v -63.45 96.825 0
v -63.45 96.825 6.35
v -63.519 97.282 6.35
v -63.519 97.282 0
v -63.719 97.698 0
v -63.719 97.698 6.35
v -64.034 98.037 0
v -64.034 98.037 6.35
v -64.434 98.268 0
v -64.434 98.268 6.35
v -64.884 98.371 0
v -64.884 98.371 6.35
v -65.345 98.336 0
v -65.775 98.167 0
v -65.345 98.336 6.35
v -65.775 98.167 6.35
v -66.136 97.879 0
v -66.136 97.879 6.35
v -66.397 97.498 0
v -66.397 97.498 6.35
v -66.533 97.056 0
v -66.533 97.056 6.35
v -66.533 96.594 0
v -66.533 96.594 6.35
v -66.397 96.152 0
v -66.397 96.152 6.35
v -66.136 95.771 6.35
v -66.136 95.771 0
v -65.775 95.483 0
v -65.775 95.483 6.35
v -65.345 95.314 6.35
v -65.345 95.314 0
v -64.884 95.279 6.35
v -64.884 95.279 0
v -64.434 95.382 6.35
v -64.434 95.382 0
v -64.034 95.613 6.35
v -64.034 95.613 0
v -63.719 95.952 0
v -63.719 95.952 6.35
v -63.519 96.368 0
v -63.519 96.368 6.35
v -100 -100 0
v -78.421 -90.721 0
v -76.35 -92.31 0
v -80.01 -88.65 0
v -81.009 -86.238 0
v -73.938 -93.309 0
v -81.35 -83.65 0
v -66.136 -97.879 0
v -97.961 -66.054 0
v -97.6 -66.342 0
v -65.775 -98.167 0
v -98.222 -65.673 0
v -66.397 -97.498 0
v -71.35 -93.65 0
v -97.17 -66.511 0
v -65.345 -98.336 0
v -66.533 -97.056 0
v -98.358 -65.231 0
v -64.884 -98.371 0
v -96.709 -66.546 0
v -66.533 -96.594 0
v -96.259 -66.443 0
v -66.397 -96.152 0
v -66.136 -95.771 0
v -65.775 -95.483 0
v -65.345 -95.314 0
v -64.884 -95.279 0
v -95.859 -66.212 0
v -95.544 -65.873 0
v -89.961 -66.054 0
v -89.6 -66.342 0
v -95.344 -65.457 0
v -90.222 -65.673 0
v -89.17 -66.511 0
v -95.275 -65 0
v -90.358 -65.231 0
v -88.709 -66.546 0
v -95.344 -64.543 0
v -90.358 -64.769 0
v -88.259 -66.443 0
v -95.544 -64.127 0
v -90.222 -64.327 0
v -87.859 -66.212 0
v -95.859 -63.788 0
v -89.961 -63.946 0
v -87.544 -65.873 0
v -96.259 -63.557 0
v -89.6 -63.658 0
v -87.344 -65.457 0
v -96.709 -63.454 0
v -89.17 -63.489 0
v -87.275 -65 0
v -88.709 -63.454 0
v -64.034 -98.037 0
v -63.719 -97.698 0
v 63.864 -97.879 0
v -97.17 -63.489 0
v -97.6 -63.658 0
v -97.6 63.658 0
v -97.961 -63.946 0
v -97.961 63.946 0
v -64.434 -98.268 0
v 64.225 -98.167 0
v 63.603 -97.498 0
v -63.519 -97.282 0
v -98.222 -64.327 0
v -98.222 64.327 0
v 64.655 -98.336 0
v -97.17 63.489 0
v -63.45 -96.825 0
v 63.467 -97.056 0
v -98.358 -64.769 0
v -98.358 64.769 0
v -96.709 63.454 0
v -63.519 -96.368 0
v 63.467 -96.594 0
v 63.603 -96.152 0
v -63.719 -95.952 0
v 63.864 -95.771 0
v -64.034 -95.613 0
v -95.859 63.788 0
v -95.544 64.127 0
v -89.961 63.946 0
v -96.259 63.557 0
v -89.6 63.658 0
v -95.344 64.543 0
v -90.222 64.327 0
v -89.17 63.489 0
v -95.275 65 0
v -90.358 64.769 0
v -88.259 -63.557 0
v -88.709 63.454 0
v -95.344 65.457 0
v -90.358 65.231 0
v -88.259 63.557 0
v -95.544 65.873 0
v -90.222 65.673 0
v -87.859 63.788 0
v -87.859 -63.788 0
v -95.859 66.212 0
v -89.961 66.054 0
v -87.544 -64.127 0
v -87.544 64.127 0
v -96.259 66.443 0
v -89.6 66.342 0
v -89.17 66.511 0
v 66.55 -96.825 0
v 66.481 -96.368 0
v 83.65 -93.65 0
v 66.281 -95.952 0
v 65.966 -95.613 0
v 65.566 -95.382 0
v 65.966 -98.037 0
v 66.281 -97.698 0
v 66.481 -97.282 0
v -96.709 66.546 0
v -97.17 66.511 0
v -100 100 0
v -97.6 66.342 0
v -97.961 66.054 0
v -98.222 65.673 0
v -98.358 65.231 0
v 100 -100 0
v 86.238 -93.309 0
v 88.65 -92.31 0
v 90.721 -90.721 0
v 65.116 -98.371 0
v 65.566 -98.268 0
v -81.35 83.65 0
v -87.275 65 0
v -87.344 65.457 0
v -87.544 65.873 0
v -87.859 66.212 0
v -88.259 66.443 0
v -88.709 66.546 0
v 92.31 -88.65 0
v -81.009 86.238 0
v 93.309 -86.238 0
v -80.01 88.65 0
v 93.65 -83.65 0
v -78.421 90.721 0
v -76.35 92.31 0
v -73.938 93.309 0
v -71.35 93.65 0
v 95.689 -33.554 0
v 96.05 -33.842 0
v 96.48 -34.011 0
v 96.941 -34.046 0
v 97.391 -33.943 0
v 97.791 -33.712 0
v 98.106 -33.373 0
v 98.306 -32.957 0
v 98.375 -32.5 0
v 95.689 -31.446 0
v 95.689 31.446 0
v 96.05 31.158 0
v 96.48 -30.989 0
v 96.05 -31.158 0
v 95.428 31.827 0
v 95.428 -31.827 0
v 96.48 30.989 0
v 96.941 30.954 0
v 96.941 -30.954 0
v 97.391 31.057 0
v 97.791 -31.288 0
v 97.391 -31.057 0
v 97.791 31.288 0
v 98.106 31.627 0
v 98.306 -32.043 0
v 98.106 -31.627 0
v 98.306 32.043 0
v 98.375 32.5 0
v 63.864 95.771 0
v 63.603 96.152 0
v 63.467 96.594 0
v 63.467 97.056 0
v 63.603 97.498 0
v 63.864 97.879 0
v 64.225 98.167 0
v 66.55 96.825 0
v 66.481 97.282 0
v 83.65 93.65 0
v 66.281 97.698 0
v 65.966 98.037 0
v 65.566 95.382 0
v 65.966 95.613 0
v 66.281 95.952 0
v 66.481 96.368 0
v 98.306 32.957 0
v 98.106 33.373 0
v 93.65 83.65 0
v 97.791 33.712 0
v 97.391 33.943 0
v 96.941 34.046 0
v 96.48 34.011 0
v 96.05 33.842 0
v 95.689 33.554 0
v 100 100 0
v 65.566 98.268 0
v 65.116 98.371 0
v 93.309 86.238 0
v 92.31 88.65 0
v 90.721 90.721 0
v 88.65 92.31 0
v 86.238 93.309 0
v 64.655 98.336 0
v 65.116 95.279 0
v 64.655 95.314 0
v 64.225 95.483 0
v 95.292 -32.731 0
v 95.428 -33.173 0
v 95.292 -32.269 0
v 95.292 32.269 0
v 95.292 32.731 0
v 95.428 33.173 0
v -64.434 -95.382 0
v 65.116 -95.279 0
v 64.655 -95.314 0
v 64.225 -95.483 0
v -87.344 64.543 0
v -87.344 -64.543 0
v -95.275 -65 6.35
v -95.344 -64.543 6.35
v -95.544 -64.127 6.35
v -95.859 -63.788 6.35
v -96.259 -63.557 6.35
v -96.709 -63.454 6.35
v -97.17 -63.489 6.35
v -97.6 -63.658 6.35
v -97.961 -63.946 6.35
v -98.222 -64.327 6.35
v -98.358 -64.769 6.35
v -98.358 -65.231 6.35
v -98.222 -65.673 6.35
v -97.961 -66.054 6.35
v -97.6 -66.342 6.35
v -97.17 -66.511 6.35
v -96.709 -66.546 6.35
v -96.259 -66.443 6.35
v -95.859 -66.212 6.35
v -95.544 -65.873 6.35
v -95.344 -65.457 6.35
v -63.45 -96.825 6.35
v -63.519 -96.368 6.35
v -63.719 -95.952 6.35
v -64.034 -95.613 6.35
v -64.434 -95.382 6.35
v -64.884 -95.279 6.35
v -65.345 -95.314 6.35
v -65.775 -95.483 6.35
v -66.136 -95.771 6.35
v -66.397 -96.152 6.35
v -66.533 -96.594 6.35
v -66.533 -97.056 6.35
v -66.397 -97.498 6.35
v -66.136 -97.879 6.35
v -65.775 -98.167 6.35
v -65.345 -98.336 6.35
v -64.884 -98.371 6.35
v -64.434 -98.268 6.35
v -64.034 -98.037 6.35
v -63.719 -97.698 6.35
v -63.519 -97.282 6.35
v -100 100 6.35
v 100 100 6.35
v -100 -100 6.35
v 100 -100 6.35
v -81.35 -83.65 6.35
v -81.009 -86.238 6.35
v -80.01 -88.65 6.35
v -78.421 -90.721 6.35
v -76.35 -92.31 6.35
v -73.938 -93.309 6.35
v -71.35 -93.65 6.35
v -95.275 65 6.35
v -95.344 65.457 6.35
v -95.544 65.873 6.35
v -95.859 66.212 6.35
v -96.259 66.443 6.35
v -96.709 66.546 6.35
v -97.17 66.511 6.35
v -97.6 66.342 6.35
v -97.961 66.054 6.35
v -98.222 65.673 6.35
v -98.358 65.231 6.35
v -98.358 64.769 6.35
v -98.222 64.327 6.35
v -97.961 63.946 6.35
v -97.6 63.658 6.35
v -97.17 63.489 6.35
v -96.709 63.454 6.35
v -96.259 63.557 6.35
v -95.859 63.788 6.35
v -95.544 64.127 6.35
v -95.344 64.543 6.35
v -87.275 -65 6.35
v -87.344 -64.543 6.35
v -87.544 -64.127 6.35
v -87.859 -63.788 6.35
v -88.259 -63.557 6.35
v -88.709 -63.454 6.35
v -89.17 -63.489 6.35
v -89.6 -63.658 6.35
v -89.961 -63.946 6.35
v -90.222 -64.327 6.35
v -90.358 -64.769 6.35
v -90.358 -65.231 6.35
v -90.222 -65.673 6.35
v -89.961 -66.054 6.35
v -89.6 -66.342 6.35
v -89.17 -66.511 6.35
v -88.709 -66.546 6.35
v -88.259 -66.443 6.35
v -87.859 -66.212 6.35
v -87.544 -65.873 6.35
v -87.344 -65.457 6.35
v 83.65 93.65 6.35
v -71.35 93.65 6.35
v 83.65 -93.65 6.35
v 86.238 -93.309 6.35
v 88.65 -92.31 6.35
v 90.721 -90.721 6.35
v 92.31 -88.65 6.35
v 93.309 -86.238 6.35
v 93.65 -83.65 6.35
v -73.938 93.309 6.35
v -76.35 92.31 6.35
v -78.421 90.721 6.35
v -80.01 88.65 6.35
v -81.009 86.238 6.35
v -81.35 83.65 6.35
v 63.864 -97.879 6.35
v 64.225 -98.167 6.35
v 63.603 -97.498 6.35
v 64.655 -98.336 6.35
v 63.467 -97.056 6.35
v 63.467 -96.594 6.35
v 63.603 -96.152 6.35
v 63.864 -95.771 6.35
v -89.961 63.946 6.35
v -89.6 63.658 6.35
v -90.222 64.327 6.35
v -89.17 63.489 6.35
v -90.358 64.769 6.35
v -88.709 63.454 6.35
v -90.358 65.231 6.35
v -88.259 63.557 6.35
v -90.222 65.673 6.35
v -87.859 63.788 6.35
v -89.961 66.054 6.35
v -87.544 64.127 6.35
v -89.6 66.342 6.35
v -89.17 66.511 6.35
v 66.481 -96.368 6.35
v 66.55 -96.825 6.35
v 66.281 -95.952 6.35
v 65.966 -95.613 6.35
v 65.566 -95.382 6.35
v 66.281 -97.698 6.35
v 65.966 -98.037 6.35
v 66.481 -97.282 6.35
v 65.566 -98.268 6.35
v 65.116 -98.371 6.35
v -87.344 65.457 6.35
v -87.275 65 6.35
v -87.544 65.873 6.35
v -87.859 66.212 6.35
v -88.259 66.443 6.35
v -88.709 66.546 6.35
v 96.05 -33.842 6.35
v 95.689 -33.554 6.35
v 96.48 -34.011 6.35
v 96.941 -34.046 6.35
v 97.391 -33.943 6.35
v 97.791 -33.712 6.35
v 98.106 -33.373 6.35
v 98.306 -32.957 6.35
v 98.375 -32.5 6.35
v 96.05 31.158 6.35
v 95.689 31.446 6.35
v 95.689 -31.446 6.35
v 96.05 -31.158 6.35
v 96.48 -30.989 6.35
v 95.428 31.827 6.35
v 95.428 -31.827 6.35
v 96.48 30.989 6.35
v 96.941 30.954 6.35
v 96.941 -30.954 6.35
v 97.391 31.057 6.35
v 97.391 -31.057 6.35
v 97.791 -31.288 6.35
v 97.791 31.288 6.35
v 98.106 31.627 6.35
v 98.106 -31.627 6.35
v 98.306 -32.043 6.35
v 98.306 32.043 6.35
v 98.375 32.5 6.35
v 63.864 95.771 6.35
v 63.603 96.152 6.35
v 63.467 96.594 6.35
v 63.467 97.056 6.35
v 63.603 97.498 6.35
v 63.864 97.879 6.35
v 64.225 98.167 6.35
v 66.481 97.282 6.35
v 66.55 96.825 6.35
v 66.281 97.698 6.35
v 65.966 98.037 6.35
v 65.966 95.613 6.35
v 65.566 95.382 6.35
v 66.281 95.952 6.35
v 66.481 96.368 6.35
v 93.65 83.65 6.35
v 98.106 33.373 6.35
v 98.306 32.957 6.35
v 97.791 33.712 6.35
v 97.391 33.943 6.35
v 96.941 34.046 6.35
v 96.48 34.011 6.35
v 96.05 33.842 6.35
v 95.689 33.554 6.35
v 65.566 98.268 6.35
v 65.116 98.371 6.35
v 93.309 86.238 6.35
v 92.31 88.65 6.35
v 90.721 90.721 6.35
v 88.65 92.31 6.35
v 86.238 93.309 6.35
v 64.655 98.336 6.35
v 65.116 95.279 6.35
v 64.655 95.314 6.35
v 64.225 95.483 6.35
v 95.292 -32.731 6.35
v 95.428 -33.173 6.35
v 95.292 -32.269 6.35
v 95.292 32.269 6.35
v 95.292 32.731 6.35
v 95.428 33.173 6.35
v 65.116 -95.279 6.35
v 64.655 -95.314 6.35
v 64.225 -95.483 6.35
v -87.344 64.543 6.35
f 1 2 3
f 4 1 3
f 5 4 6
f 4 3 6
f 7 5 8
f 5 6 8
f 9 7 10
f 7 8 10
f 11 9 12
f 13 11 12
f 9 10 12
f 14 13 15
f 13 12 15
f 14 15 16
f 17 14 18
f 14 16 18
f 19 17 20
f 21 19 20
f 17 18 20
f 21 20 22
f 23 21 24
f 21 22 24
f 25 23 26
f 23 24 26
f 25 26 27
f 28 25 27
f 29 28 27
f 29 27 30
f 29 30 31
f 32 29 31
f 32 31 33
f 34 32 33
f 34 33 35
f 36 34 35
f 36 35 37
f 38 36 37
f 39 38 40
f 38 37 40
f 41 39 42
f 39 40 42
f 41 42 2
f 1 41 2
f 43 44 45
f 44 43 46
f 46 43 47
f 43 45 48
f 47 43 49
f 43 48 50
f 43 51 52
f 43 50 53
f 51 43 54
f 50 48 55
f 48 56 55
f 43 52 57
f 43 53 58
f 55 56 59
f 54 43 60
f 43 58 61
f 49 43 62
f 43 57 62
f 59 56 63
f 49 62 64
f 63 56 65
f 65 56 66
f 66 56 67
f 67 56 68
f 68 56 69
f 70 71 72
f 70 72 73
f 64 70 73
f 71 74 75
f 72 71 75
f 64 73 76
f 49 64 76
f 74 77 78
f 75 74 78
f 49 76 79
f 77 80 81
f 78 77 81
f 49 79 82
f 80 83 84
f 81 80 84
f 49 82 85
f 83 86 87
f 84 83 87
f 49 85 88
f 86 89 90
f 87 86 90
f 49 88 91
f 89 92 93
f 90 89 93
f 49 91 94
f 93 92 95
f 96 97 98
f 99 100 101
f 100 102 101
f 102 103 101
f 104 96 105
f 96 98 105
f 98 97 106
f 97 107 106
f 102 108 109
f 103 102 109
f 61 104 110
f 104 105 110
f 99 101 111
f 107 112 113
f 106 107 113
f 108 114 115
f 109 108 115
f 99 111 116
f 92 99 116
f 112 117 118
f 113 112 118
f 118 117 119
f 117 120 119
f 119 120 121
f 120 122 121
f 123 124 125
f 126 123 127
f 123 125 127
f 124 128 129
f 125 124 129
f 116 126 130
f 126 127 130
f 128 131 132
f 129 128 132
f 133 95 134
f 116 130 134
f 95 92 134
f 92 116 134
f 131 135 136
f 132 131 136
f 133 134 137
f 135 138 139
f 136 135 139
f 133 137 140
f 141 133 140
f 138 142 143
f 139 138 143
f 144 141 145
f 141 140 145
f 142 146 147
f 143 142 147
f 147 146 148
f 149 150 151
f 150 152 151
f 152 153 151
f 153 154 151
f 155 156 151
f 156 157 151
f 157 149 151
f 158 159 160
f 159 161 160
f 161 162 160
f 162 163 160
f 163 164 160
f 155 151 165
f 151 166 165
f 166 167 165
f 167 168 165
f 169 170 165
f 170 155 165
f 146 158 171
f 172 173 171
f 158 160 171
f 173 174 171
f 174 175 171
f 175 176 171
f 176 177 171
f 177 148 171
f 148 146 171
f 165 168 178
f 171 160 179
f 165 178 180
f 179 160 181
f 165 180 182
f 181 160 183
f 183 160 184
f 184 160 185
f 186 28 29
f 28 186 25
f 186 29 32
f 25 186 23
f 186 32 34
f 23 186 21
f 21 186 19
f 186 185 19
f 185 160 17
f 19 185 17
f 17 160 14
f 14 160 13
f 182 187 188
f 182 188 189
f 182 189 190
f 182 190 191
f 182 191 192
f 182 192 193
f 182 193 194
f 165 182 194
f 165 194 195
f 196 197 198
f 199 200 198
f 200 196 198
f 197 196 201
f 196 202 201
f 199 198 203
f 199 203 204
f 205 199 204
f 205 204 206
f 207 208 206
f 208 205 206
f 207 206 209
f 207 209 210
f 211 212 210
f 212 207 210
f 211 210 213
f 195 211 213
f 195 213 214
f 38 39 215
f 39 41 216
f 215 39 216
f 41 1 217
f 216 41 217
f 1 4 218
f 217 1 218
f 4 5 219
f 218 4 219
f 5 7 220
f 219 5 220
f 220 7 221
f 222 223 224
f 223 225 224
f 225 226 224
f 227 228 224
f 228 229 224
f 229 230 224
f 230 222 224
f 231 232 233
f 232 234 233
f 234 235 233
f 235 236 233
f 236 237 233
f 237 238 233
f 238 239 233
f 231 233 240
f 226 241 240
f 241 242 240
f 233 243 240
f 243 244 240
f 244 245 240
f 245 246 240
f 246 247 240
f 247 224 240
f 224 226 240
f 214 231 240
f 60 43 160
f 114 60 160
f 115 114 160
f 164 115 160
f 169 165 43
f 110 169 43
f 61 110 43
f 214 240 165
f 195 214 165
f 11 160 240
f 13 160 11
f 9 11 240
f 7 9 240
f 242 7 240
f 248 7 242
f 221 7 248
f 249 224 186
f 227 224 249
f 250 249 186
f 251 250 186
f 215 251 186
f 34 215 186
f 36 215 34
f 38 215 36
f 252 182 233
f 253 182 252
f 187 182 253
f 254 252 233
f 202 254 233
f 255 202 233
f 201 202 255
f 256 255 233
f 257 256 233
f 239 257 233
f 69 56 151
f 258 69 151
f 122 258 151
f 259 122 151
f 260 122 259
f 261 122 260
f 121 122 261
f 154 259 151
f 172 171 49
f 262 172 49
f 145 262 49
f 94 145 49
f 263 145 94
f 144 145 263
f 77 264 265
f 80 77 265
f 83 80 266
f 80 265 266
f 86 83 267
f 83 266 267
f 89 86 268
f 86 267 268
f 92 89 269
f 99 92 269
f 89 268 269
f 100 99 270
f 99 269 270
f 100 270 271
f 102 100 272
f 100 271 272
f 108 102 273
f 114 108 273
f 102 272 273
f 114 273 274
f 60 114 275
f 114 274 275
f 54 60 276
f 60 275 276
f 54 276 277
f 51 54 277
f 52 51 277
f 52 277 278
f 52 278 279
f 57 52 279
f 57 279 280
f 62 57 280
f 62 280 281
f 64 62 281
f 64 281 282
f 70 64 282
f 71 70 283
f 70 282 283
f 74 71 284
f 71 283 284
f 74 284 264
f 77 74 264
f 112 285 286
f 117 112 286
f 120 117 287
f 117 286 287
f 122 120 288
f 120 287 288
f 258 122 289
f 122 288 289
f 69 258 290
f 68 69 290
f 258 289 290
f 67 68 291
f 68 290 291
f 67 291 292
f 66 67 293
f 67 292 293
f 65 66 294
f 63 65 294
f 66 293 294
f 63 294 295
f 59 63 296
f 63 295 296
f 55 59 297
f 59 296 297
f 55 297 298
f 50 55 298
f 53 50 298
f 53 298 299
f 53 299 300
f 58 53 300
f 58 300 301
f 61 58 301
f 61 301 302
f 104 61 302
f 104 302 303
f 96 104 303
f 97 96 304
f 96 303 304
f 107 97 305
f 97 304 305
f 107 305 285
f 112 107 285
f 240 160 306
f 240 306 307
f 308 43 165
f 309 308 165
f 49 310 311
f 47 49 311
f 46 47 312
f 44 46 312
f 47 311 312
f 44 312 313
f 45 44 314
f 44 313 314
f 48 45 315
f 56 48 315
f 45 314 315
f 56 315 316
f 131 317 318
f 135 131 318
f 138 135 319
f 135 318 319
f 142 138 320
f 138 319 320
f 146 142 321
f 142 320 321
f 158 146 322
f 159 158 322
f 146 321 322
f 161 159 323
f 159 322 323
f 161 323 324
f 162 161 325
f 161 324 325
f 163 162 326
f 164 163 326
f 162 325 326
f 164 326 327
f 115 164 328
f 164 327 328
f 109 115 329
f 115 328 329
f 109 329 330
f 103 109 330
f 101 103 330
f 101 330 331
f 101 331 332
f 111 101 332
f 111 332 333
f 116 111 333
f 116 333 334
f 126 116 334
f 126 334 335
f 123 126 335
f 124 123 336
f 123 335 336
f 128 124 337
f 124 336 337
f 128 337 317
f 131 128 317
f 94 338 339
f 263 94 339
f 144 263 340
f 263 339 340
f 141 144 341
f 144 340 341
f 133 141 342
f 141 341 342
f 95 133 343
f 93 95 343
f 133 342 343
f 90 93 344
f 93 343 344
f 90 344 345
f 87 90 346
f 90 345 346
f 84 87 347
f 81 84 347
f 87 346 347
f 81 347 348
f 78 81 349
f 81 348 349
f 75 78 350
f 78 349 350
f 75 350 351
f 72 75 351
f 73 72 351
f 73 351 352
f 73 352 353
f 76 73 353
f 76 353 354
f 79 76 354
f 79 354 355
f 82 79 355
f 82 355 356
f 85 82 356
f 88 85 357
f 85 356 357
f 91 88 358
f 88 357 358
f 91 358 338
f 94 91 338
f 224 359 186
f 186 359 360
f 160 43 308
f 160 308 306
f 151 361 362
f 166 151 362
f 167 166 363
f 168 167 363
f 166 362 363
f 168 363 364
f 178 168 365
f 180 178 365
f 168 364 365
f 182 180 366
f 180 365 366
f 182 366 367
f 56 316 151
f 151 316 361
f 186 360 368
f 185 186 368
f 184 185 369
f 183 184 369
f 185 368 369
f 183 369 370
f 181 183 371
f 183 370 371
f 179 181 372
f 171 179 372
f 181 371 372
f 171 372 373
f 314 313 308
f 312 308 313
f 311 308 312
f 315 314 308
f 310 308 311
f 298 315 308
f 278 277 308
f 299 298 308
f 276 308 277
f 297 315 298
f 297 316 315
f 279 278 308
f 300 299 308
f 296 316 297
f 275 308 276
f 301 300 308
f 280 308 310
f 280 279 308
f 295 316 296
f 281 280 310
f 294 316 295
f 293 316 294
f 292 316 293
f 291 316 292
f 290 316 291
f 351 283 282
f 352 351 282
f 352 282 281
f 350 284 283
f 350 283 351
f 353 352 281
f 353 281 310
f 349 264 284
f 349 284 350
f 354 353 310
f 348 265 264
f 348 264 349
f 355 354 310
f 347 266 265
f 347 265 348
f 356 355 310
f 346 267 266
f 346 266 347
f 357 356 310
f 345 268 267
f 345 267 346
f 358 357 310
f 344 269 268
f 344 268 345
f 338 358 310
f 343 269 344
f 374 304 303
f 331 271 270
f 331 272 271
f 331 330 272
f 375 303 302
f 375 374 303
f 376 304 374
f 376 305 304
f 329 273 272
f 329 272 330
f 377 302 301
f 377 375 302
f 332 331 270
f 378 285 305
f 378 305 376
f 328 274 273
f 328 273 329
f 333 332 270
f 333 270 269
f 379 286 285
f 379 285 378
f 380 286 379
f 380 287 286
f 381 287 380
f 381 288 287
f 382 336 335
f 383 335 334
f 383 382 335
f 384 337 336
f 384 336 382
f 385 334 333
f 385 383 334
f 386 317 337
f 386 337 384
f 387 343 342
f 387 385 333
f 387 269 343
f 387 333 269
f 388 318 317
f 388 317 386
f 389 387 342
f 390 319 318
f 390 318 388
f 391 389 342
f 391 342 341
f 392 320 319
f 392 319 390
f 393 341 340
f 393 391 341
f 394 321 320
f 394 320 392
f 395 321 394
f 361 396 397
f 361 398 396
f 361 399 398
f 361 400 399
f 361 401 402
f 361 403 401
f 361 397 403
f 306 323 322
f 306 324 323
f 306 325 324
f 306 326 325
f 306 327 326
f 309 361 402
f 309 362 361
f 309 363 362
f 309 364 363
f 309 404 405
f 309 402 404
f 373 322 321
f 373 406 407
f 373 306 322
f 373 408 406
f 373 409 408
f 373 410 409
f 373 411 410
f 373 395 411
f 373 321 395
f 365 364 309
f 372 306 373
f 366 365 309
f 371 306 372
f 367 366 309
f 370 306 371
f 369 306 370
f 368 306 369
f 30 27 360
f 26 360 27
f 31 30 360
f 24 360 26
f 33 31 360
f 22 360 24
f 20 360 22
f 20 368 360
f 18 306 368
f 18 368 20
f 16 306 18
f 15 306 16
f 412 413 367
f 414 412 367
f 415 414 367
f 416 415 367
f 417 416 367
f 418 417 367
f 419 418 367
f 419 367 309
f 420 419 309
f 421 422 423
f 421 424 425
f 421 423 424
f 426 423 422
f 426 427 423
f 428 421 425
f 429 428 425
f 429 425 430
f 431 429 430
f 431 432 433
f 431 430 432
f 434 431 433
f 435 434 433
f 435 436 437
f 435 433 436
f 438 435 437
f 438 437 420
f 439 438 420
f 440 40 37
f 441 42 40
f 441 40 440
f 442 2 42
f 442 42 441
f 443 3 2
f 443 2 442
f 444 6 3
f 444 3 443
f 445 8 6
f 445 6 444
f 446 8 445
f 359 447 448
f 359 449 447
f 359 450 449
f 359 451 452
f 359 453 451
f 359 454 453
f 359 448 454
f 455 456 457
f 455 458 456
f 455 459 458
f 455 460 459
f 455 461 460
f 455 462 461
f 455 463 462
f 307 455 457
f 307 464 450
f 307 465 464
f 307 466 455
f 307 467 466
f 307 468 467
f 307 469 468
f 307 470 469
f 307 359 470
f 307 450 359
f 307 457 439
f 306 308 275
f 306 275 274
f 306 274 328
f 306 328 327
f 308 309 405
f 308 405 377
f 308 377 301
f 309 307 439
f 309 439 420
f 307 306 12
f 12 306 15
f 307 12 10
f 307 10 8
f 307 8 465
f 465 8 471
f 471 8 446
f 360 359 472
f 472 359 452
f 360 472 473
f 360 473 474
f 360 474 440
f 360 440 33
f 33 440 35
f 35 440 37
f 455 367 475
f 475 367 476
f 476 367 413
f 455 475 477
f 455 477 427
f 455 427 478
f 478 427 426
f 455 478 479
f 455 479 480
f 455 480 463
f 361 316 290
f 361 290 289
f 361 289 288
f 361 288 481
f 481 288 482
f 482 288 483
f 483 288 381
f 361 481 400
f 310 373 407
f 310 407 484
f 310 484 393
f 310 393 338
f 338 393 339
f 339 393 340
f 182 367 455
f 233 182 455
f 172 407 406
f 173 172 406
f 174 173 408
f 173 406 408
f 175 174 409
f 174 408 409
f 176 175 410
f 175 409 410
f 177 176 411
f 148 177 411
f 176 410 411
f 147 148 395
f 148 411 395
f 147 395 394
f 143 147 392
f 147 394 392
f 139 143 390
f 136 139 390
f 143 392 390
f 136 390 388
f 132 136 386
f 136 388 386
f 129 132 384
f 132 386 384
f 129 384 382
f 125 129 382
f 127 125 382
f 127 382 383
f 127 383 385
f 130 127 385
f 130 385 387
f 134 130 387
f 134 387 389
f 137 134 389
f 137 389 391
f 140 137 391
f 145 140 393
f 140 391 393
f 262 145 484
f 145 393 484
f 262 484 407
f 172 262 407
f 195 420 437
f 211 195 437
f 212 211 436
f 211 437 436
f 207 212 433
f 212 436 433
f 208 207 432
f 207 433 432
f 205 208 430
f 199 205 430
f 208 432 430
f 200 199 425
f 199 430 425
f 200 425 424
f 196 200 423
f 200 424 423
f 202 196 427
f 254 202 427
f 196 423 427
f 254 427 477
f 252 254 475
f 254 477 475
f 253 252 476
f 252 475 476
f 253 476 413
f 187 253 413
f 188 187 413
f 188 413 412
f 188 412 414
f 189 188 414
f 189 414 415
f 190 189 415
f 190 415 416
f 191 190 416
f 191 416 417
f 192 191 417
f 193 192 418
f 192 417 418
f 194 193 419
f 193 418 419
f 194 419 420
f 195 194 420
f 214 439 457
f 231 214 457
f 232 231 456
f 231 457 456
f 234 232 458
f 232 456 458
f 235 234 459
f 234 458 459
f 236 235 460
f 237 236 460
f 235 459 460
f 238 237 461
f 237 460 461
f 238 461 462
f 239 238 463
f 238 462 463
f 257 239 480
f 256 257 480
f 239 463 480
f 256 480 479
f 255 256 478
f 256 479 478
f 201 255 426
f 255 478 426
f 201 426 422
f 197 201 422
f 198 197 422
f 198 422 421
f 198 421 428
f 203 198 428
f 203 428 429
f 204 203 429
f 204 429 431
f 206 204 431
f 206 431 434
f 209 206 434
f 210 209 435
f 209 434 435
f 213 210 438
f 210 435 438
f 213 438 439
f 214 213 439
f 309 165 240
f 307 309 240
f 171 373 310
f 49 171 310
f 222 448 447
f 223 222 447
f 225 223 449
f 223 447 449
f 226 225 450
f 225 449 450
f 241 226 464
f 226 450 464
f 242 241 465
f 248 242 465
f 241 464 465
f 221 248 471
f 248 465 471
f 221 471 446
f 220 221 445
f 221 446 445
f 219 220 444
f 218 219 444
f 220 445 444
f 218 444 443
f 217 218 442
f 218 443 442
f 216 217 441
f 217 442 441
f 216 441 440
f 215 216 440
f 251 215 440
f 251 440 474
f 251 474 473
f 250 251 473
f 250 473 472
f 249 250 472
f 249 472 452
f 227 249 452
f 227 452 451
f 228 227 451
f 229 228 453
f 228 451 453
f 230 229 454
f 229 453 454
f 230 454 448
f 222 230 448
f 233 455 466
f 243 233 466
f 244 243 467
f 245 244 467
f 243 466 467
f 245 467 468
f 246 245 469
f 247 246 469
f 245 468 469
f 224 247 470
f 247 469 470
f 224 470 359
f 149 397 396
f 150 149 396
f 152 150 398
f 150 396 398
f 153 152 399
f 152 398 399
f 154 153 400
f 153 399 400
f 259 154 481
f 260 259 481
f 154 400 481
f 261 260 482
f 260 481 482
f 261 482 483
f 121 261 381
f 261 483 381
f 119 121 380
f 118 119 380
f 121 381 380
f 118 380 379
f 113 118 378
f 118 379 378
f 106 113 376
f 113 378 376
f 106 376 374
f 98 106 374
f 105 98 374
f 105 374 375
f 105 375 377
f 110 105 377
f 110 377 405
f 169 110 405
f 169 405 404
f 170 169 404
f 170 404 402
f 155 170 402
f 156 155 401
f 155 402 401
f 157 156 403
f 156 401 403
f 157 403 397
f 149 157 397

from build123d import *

# Parameters (mm, degrees)
SKETCH1_W           = 200
SKETCH1_H           = 200
BOSS_EXTRUDE1_DEPTH = 6.35
CUT_EXTRUDE1_DEPTH  = 6.35
SKETCH3_R           = 1.55
CUT_EXTRUDE2_DEPTH  = 6.35


with BuildPart() as part:
    # Sketch1 → Boss-Extrude1 (new body)
    with BuildSketch(Plane.XY):
        Rectangle(SKETCH1_W, SKETCH1_H)
    extrude(amount=BOSS_EXTRUDE1_DEPTH)

    # Sketch2 → Cut-Extrude1 (cut)
    with BuildSketch(Plane.XY.offset(6.35)):
        with BuildLine():
            Line((83.65, 93.65), (-71.35, 93.65))
            ThreePointArc((-71.35, 93.65), (-78.421067812, 90.721067812), (-81.35, 83.65))
            Line((-81.35, 83.65), (-81.35, -83.65))
            ThreePointArc((-81.35, -83.65), (-78.421067812, -90.721067812), (-71.35, -93.65))
            Line((-71.35, -93.65), (83.65, -93.65))
            ThreePointArc((83.65, -93.65), (90.721067812, -90.721067812), (93.65, -83.65))
            Line((93.65, -83.65), (93.65, 83.65))
            ThreePointArc((93.65, 83.65), (90.721067812, 90.721067812), (83.65, 93.65))
        make_face()
    extrude(amount=-CUT_EXTRUDE1_DEPTH, mode=Mode.SUBTRACT)

    # Sketch3 → Cut-Extrude2 (cut)
    with BuildSketch(Plane.XY.offset(6.35)):
        with Locations((-65, -96.825)):
            Circle(SKETCH3_R)
        with Locations((65, -96.825)):
            Circle(SKETCH3_R)
        with Locations((65, 96.825)):
            Circle(SKETCH3_R)
        with Locations((-65, 96.825)):
            Circle(SKETCH3_R)
        with Locations((96.825, 32.5)):
            Circle(SKETCH3_R)
        with Locations((96.825, -32.5)):
            Circle(SKETCH3_R)
        with Locations((-96.825, 65)):
            Circle(SKETCH3_R)
        with Locations((-88.825, 65)):
            Circle(SKETCH3_R)
        with Locations((-96.825, -65)):
            Circle(SKETCH3_R)
        with Locations((-88.825, -65)):
            Circle(SKETCH3_R)
        with BuildLine():
            Line((93.65, -83.65), (93.65, 83.65))
            ThreePointArc((93.65, 83.65), (90.721067812, 90.721067812), (83.65, 93.65))
            Line((83.65, 93.65), (-71.35, 93.65))
            ThreePointArc((-71.35, 93.65), (-78.421067812, 90.721067812), (-81.35, 83.65))
            Line((-81.35, 83.65), (-81.35, -83.65))
            ThreePointArc((-81.35, -83.65), (-78.421067812, -90.721067812), (-71.35, -93.65))
            Line((-71.35, -93.65), (83.65, -93.65))
            ThreePointArc((83.65, -93.65), (90.721067812, -90.721067812), (93.65, -83.65))
        make_face()
    extrude(amount=-CUT_EXTRUDE2_DEPTH, mode=Mode.SUBTRACT)


solid = part.part
